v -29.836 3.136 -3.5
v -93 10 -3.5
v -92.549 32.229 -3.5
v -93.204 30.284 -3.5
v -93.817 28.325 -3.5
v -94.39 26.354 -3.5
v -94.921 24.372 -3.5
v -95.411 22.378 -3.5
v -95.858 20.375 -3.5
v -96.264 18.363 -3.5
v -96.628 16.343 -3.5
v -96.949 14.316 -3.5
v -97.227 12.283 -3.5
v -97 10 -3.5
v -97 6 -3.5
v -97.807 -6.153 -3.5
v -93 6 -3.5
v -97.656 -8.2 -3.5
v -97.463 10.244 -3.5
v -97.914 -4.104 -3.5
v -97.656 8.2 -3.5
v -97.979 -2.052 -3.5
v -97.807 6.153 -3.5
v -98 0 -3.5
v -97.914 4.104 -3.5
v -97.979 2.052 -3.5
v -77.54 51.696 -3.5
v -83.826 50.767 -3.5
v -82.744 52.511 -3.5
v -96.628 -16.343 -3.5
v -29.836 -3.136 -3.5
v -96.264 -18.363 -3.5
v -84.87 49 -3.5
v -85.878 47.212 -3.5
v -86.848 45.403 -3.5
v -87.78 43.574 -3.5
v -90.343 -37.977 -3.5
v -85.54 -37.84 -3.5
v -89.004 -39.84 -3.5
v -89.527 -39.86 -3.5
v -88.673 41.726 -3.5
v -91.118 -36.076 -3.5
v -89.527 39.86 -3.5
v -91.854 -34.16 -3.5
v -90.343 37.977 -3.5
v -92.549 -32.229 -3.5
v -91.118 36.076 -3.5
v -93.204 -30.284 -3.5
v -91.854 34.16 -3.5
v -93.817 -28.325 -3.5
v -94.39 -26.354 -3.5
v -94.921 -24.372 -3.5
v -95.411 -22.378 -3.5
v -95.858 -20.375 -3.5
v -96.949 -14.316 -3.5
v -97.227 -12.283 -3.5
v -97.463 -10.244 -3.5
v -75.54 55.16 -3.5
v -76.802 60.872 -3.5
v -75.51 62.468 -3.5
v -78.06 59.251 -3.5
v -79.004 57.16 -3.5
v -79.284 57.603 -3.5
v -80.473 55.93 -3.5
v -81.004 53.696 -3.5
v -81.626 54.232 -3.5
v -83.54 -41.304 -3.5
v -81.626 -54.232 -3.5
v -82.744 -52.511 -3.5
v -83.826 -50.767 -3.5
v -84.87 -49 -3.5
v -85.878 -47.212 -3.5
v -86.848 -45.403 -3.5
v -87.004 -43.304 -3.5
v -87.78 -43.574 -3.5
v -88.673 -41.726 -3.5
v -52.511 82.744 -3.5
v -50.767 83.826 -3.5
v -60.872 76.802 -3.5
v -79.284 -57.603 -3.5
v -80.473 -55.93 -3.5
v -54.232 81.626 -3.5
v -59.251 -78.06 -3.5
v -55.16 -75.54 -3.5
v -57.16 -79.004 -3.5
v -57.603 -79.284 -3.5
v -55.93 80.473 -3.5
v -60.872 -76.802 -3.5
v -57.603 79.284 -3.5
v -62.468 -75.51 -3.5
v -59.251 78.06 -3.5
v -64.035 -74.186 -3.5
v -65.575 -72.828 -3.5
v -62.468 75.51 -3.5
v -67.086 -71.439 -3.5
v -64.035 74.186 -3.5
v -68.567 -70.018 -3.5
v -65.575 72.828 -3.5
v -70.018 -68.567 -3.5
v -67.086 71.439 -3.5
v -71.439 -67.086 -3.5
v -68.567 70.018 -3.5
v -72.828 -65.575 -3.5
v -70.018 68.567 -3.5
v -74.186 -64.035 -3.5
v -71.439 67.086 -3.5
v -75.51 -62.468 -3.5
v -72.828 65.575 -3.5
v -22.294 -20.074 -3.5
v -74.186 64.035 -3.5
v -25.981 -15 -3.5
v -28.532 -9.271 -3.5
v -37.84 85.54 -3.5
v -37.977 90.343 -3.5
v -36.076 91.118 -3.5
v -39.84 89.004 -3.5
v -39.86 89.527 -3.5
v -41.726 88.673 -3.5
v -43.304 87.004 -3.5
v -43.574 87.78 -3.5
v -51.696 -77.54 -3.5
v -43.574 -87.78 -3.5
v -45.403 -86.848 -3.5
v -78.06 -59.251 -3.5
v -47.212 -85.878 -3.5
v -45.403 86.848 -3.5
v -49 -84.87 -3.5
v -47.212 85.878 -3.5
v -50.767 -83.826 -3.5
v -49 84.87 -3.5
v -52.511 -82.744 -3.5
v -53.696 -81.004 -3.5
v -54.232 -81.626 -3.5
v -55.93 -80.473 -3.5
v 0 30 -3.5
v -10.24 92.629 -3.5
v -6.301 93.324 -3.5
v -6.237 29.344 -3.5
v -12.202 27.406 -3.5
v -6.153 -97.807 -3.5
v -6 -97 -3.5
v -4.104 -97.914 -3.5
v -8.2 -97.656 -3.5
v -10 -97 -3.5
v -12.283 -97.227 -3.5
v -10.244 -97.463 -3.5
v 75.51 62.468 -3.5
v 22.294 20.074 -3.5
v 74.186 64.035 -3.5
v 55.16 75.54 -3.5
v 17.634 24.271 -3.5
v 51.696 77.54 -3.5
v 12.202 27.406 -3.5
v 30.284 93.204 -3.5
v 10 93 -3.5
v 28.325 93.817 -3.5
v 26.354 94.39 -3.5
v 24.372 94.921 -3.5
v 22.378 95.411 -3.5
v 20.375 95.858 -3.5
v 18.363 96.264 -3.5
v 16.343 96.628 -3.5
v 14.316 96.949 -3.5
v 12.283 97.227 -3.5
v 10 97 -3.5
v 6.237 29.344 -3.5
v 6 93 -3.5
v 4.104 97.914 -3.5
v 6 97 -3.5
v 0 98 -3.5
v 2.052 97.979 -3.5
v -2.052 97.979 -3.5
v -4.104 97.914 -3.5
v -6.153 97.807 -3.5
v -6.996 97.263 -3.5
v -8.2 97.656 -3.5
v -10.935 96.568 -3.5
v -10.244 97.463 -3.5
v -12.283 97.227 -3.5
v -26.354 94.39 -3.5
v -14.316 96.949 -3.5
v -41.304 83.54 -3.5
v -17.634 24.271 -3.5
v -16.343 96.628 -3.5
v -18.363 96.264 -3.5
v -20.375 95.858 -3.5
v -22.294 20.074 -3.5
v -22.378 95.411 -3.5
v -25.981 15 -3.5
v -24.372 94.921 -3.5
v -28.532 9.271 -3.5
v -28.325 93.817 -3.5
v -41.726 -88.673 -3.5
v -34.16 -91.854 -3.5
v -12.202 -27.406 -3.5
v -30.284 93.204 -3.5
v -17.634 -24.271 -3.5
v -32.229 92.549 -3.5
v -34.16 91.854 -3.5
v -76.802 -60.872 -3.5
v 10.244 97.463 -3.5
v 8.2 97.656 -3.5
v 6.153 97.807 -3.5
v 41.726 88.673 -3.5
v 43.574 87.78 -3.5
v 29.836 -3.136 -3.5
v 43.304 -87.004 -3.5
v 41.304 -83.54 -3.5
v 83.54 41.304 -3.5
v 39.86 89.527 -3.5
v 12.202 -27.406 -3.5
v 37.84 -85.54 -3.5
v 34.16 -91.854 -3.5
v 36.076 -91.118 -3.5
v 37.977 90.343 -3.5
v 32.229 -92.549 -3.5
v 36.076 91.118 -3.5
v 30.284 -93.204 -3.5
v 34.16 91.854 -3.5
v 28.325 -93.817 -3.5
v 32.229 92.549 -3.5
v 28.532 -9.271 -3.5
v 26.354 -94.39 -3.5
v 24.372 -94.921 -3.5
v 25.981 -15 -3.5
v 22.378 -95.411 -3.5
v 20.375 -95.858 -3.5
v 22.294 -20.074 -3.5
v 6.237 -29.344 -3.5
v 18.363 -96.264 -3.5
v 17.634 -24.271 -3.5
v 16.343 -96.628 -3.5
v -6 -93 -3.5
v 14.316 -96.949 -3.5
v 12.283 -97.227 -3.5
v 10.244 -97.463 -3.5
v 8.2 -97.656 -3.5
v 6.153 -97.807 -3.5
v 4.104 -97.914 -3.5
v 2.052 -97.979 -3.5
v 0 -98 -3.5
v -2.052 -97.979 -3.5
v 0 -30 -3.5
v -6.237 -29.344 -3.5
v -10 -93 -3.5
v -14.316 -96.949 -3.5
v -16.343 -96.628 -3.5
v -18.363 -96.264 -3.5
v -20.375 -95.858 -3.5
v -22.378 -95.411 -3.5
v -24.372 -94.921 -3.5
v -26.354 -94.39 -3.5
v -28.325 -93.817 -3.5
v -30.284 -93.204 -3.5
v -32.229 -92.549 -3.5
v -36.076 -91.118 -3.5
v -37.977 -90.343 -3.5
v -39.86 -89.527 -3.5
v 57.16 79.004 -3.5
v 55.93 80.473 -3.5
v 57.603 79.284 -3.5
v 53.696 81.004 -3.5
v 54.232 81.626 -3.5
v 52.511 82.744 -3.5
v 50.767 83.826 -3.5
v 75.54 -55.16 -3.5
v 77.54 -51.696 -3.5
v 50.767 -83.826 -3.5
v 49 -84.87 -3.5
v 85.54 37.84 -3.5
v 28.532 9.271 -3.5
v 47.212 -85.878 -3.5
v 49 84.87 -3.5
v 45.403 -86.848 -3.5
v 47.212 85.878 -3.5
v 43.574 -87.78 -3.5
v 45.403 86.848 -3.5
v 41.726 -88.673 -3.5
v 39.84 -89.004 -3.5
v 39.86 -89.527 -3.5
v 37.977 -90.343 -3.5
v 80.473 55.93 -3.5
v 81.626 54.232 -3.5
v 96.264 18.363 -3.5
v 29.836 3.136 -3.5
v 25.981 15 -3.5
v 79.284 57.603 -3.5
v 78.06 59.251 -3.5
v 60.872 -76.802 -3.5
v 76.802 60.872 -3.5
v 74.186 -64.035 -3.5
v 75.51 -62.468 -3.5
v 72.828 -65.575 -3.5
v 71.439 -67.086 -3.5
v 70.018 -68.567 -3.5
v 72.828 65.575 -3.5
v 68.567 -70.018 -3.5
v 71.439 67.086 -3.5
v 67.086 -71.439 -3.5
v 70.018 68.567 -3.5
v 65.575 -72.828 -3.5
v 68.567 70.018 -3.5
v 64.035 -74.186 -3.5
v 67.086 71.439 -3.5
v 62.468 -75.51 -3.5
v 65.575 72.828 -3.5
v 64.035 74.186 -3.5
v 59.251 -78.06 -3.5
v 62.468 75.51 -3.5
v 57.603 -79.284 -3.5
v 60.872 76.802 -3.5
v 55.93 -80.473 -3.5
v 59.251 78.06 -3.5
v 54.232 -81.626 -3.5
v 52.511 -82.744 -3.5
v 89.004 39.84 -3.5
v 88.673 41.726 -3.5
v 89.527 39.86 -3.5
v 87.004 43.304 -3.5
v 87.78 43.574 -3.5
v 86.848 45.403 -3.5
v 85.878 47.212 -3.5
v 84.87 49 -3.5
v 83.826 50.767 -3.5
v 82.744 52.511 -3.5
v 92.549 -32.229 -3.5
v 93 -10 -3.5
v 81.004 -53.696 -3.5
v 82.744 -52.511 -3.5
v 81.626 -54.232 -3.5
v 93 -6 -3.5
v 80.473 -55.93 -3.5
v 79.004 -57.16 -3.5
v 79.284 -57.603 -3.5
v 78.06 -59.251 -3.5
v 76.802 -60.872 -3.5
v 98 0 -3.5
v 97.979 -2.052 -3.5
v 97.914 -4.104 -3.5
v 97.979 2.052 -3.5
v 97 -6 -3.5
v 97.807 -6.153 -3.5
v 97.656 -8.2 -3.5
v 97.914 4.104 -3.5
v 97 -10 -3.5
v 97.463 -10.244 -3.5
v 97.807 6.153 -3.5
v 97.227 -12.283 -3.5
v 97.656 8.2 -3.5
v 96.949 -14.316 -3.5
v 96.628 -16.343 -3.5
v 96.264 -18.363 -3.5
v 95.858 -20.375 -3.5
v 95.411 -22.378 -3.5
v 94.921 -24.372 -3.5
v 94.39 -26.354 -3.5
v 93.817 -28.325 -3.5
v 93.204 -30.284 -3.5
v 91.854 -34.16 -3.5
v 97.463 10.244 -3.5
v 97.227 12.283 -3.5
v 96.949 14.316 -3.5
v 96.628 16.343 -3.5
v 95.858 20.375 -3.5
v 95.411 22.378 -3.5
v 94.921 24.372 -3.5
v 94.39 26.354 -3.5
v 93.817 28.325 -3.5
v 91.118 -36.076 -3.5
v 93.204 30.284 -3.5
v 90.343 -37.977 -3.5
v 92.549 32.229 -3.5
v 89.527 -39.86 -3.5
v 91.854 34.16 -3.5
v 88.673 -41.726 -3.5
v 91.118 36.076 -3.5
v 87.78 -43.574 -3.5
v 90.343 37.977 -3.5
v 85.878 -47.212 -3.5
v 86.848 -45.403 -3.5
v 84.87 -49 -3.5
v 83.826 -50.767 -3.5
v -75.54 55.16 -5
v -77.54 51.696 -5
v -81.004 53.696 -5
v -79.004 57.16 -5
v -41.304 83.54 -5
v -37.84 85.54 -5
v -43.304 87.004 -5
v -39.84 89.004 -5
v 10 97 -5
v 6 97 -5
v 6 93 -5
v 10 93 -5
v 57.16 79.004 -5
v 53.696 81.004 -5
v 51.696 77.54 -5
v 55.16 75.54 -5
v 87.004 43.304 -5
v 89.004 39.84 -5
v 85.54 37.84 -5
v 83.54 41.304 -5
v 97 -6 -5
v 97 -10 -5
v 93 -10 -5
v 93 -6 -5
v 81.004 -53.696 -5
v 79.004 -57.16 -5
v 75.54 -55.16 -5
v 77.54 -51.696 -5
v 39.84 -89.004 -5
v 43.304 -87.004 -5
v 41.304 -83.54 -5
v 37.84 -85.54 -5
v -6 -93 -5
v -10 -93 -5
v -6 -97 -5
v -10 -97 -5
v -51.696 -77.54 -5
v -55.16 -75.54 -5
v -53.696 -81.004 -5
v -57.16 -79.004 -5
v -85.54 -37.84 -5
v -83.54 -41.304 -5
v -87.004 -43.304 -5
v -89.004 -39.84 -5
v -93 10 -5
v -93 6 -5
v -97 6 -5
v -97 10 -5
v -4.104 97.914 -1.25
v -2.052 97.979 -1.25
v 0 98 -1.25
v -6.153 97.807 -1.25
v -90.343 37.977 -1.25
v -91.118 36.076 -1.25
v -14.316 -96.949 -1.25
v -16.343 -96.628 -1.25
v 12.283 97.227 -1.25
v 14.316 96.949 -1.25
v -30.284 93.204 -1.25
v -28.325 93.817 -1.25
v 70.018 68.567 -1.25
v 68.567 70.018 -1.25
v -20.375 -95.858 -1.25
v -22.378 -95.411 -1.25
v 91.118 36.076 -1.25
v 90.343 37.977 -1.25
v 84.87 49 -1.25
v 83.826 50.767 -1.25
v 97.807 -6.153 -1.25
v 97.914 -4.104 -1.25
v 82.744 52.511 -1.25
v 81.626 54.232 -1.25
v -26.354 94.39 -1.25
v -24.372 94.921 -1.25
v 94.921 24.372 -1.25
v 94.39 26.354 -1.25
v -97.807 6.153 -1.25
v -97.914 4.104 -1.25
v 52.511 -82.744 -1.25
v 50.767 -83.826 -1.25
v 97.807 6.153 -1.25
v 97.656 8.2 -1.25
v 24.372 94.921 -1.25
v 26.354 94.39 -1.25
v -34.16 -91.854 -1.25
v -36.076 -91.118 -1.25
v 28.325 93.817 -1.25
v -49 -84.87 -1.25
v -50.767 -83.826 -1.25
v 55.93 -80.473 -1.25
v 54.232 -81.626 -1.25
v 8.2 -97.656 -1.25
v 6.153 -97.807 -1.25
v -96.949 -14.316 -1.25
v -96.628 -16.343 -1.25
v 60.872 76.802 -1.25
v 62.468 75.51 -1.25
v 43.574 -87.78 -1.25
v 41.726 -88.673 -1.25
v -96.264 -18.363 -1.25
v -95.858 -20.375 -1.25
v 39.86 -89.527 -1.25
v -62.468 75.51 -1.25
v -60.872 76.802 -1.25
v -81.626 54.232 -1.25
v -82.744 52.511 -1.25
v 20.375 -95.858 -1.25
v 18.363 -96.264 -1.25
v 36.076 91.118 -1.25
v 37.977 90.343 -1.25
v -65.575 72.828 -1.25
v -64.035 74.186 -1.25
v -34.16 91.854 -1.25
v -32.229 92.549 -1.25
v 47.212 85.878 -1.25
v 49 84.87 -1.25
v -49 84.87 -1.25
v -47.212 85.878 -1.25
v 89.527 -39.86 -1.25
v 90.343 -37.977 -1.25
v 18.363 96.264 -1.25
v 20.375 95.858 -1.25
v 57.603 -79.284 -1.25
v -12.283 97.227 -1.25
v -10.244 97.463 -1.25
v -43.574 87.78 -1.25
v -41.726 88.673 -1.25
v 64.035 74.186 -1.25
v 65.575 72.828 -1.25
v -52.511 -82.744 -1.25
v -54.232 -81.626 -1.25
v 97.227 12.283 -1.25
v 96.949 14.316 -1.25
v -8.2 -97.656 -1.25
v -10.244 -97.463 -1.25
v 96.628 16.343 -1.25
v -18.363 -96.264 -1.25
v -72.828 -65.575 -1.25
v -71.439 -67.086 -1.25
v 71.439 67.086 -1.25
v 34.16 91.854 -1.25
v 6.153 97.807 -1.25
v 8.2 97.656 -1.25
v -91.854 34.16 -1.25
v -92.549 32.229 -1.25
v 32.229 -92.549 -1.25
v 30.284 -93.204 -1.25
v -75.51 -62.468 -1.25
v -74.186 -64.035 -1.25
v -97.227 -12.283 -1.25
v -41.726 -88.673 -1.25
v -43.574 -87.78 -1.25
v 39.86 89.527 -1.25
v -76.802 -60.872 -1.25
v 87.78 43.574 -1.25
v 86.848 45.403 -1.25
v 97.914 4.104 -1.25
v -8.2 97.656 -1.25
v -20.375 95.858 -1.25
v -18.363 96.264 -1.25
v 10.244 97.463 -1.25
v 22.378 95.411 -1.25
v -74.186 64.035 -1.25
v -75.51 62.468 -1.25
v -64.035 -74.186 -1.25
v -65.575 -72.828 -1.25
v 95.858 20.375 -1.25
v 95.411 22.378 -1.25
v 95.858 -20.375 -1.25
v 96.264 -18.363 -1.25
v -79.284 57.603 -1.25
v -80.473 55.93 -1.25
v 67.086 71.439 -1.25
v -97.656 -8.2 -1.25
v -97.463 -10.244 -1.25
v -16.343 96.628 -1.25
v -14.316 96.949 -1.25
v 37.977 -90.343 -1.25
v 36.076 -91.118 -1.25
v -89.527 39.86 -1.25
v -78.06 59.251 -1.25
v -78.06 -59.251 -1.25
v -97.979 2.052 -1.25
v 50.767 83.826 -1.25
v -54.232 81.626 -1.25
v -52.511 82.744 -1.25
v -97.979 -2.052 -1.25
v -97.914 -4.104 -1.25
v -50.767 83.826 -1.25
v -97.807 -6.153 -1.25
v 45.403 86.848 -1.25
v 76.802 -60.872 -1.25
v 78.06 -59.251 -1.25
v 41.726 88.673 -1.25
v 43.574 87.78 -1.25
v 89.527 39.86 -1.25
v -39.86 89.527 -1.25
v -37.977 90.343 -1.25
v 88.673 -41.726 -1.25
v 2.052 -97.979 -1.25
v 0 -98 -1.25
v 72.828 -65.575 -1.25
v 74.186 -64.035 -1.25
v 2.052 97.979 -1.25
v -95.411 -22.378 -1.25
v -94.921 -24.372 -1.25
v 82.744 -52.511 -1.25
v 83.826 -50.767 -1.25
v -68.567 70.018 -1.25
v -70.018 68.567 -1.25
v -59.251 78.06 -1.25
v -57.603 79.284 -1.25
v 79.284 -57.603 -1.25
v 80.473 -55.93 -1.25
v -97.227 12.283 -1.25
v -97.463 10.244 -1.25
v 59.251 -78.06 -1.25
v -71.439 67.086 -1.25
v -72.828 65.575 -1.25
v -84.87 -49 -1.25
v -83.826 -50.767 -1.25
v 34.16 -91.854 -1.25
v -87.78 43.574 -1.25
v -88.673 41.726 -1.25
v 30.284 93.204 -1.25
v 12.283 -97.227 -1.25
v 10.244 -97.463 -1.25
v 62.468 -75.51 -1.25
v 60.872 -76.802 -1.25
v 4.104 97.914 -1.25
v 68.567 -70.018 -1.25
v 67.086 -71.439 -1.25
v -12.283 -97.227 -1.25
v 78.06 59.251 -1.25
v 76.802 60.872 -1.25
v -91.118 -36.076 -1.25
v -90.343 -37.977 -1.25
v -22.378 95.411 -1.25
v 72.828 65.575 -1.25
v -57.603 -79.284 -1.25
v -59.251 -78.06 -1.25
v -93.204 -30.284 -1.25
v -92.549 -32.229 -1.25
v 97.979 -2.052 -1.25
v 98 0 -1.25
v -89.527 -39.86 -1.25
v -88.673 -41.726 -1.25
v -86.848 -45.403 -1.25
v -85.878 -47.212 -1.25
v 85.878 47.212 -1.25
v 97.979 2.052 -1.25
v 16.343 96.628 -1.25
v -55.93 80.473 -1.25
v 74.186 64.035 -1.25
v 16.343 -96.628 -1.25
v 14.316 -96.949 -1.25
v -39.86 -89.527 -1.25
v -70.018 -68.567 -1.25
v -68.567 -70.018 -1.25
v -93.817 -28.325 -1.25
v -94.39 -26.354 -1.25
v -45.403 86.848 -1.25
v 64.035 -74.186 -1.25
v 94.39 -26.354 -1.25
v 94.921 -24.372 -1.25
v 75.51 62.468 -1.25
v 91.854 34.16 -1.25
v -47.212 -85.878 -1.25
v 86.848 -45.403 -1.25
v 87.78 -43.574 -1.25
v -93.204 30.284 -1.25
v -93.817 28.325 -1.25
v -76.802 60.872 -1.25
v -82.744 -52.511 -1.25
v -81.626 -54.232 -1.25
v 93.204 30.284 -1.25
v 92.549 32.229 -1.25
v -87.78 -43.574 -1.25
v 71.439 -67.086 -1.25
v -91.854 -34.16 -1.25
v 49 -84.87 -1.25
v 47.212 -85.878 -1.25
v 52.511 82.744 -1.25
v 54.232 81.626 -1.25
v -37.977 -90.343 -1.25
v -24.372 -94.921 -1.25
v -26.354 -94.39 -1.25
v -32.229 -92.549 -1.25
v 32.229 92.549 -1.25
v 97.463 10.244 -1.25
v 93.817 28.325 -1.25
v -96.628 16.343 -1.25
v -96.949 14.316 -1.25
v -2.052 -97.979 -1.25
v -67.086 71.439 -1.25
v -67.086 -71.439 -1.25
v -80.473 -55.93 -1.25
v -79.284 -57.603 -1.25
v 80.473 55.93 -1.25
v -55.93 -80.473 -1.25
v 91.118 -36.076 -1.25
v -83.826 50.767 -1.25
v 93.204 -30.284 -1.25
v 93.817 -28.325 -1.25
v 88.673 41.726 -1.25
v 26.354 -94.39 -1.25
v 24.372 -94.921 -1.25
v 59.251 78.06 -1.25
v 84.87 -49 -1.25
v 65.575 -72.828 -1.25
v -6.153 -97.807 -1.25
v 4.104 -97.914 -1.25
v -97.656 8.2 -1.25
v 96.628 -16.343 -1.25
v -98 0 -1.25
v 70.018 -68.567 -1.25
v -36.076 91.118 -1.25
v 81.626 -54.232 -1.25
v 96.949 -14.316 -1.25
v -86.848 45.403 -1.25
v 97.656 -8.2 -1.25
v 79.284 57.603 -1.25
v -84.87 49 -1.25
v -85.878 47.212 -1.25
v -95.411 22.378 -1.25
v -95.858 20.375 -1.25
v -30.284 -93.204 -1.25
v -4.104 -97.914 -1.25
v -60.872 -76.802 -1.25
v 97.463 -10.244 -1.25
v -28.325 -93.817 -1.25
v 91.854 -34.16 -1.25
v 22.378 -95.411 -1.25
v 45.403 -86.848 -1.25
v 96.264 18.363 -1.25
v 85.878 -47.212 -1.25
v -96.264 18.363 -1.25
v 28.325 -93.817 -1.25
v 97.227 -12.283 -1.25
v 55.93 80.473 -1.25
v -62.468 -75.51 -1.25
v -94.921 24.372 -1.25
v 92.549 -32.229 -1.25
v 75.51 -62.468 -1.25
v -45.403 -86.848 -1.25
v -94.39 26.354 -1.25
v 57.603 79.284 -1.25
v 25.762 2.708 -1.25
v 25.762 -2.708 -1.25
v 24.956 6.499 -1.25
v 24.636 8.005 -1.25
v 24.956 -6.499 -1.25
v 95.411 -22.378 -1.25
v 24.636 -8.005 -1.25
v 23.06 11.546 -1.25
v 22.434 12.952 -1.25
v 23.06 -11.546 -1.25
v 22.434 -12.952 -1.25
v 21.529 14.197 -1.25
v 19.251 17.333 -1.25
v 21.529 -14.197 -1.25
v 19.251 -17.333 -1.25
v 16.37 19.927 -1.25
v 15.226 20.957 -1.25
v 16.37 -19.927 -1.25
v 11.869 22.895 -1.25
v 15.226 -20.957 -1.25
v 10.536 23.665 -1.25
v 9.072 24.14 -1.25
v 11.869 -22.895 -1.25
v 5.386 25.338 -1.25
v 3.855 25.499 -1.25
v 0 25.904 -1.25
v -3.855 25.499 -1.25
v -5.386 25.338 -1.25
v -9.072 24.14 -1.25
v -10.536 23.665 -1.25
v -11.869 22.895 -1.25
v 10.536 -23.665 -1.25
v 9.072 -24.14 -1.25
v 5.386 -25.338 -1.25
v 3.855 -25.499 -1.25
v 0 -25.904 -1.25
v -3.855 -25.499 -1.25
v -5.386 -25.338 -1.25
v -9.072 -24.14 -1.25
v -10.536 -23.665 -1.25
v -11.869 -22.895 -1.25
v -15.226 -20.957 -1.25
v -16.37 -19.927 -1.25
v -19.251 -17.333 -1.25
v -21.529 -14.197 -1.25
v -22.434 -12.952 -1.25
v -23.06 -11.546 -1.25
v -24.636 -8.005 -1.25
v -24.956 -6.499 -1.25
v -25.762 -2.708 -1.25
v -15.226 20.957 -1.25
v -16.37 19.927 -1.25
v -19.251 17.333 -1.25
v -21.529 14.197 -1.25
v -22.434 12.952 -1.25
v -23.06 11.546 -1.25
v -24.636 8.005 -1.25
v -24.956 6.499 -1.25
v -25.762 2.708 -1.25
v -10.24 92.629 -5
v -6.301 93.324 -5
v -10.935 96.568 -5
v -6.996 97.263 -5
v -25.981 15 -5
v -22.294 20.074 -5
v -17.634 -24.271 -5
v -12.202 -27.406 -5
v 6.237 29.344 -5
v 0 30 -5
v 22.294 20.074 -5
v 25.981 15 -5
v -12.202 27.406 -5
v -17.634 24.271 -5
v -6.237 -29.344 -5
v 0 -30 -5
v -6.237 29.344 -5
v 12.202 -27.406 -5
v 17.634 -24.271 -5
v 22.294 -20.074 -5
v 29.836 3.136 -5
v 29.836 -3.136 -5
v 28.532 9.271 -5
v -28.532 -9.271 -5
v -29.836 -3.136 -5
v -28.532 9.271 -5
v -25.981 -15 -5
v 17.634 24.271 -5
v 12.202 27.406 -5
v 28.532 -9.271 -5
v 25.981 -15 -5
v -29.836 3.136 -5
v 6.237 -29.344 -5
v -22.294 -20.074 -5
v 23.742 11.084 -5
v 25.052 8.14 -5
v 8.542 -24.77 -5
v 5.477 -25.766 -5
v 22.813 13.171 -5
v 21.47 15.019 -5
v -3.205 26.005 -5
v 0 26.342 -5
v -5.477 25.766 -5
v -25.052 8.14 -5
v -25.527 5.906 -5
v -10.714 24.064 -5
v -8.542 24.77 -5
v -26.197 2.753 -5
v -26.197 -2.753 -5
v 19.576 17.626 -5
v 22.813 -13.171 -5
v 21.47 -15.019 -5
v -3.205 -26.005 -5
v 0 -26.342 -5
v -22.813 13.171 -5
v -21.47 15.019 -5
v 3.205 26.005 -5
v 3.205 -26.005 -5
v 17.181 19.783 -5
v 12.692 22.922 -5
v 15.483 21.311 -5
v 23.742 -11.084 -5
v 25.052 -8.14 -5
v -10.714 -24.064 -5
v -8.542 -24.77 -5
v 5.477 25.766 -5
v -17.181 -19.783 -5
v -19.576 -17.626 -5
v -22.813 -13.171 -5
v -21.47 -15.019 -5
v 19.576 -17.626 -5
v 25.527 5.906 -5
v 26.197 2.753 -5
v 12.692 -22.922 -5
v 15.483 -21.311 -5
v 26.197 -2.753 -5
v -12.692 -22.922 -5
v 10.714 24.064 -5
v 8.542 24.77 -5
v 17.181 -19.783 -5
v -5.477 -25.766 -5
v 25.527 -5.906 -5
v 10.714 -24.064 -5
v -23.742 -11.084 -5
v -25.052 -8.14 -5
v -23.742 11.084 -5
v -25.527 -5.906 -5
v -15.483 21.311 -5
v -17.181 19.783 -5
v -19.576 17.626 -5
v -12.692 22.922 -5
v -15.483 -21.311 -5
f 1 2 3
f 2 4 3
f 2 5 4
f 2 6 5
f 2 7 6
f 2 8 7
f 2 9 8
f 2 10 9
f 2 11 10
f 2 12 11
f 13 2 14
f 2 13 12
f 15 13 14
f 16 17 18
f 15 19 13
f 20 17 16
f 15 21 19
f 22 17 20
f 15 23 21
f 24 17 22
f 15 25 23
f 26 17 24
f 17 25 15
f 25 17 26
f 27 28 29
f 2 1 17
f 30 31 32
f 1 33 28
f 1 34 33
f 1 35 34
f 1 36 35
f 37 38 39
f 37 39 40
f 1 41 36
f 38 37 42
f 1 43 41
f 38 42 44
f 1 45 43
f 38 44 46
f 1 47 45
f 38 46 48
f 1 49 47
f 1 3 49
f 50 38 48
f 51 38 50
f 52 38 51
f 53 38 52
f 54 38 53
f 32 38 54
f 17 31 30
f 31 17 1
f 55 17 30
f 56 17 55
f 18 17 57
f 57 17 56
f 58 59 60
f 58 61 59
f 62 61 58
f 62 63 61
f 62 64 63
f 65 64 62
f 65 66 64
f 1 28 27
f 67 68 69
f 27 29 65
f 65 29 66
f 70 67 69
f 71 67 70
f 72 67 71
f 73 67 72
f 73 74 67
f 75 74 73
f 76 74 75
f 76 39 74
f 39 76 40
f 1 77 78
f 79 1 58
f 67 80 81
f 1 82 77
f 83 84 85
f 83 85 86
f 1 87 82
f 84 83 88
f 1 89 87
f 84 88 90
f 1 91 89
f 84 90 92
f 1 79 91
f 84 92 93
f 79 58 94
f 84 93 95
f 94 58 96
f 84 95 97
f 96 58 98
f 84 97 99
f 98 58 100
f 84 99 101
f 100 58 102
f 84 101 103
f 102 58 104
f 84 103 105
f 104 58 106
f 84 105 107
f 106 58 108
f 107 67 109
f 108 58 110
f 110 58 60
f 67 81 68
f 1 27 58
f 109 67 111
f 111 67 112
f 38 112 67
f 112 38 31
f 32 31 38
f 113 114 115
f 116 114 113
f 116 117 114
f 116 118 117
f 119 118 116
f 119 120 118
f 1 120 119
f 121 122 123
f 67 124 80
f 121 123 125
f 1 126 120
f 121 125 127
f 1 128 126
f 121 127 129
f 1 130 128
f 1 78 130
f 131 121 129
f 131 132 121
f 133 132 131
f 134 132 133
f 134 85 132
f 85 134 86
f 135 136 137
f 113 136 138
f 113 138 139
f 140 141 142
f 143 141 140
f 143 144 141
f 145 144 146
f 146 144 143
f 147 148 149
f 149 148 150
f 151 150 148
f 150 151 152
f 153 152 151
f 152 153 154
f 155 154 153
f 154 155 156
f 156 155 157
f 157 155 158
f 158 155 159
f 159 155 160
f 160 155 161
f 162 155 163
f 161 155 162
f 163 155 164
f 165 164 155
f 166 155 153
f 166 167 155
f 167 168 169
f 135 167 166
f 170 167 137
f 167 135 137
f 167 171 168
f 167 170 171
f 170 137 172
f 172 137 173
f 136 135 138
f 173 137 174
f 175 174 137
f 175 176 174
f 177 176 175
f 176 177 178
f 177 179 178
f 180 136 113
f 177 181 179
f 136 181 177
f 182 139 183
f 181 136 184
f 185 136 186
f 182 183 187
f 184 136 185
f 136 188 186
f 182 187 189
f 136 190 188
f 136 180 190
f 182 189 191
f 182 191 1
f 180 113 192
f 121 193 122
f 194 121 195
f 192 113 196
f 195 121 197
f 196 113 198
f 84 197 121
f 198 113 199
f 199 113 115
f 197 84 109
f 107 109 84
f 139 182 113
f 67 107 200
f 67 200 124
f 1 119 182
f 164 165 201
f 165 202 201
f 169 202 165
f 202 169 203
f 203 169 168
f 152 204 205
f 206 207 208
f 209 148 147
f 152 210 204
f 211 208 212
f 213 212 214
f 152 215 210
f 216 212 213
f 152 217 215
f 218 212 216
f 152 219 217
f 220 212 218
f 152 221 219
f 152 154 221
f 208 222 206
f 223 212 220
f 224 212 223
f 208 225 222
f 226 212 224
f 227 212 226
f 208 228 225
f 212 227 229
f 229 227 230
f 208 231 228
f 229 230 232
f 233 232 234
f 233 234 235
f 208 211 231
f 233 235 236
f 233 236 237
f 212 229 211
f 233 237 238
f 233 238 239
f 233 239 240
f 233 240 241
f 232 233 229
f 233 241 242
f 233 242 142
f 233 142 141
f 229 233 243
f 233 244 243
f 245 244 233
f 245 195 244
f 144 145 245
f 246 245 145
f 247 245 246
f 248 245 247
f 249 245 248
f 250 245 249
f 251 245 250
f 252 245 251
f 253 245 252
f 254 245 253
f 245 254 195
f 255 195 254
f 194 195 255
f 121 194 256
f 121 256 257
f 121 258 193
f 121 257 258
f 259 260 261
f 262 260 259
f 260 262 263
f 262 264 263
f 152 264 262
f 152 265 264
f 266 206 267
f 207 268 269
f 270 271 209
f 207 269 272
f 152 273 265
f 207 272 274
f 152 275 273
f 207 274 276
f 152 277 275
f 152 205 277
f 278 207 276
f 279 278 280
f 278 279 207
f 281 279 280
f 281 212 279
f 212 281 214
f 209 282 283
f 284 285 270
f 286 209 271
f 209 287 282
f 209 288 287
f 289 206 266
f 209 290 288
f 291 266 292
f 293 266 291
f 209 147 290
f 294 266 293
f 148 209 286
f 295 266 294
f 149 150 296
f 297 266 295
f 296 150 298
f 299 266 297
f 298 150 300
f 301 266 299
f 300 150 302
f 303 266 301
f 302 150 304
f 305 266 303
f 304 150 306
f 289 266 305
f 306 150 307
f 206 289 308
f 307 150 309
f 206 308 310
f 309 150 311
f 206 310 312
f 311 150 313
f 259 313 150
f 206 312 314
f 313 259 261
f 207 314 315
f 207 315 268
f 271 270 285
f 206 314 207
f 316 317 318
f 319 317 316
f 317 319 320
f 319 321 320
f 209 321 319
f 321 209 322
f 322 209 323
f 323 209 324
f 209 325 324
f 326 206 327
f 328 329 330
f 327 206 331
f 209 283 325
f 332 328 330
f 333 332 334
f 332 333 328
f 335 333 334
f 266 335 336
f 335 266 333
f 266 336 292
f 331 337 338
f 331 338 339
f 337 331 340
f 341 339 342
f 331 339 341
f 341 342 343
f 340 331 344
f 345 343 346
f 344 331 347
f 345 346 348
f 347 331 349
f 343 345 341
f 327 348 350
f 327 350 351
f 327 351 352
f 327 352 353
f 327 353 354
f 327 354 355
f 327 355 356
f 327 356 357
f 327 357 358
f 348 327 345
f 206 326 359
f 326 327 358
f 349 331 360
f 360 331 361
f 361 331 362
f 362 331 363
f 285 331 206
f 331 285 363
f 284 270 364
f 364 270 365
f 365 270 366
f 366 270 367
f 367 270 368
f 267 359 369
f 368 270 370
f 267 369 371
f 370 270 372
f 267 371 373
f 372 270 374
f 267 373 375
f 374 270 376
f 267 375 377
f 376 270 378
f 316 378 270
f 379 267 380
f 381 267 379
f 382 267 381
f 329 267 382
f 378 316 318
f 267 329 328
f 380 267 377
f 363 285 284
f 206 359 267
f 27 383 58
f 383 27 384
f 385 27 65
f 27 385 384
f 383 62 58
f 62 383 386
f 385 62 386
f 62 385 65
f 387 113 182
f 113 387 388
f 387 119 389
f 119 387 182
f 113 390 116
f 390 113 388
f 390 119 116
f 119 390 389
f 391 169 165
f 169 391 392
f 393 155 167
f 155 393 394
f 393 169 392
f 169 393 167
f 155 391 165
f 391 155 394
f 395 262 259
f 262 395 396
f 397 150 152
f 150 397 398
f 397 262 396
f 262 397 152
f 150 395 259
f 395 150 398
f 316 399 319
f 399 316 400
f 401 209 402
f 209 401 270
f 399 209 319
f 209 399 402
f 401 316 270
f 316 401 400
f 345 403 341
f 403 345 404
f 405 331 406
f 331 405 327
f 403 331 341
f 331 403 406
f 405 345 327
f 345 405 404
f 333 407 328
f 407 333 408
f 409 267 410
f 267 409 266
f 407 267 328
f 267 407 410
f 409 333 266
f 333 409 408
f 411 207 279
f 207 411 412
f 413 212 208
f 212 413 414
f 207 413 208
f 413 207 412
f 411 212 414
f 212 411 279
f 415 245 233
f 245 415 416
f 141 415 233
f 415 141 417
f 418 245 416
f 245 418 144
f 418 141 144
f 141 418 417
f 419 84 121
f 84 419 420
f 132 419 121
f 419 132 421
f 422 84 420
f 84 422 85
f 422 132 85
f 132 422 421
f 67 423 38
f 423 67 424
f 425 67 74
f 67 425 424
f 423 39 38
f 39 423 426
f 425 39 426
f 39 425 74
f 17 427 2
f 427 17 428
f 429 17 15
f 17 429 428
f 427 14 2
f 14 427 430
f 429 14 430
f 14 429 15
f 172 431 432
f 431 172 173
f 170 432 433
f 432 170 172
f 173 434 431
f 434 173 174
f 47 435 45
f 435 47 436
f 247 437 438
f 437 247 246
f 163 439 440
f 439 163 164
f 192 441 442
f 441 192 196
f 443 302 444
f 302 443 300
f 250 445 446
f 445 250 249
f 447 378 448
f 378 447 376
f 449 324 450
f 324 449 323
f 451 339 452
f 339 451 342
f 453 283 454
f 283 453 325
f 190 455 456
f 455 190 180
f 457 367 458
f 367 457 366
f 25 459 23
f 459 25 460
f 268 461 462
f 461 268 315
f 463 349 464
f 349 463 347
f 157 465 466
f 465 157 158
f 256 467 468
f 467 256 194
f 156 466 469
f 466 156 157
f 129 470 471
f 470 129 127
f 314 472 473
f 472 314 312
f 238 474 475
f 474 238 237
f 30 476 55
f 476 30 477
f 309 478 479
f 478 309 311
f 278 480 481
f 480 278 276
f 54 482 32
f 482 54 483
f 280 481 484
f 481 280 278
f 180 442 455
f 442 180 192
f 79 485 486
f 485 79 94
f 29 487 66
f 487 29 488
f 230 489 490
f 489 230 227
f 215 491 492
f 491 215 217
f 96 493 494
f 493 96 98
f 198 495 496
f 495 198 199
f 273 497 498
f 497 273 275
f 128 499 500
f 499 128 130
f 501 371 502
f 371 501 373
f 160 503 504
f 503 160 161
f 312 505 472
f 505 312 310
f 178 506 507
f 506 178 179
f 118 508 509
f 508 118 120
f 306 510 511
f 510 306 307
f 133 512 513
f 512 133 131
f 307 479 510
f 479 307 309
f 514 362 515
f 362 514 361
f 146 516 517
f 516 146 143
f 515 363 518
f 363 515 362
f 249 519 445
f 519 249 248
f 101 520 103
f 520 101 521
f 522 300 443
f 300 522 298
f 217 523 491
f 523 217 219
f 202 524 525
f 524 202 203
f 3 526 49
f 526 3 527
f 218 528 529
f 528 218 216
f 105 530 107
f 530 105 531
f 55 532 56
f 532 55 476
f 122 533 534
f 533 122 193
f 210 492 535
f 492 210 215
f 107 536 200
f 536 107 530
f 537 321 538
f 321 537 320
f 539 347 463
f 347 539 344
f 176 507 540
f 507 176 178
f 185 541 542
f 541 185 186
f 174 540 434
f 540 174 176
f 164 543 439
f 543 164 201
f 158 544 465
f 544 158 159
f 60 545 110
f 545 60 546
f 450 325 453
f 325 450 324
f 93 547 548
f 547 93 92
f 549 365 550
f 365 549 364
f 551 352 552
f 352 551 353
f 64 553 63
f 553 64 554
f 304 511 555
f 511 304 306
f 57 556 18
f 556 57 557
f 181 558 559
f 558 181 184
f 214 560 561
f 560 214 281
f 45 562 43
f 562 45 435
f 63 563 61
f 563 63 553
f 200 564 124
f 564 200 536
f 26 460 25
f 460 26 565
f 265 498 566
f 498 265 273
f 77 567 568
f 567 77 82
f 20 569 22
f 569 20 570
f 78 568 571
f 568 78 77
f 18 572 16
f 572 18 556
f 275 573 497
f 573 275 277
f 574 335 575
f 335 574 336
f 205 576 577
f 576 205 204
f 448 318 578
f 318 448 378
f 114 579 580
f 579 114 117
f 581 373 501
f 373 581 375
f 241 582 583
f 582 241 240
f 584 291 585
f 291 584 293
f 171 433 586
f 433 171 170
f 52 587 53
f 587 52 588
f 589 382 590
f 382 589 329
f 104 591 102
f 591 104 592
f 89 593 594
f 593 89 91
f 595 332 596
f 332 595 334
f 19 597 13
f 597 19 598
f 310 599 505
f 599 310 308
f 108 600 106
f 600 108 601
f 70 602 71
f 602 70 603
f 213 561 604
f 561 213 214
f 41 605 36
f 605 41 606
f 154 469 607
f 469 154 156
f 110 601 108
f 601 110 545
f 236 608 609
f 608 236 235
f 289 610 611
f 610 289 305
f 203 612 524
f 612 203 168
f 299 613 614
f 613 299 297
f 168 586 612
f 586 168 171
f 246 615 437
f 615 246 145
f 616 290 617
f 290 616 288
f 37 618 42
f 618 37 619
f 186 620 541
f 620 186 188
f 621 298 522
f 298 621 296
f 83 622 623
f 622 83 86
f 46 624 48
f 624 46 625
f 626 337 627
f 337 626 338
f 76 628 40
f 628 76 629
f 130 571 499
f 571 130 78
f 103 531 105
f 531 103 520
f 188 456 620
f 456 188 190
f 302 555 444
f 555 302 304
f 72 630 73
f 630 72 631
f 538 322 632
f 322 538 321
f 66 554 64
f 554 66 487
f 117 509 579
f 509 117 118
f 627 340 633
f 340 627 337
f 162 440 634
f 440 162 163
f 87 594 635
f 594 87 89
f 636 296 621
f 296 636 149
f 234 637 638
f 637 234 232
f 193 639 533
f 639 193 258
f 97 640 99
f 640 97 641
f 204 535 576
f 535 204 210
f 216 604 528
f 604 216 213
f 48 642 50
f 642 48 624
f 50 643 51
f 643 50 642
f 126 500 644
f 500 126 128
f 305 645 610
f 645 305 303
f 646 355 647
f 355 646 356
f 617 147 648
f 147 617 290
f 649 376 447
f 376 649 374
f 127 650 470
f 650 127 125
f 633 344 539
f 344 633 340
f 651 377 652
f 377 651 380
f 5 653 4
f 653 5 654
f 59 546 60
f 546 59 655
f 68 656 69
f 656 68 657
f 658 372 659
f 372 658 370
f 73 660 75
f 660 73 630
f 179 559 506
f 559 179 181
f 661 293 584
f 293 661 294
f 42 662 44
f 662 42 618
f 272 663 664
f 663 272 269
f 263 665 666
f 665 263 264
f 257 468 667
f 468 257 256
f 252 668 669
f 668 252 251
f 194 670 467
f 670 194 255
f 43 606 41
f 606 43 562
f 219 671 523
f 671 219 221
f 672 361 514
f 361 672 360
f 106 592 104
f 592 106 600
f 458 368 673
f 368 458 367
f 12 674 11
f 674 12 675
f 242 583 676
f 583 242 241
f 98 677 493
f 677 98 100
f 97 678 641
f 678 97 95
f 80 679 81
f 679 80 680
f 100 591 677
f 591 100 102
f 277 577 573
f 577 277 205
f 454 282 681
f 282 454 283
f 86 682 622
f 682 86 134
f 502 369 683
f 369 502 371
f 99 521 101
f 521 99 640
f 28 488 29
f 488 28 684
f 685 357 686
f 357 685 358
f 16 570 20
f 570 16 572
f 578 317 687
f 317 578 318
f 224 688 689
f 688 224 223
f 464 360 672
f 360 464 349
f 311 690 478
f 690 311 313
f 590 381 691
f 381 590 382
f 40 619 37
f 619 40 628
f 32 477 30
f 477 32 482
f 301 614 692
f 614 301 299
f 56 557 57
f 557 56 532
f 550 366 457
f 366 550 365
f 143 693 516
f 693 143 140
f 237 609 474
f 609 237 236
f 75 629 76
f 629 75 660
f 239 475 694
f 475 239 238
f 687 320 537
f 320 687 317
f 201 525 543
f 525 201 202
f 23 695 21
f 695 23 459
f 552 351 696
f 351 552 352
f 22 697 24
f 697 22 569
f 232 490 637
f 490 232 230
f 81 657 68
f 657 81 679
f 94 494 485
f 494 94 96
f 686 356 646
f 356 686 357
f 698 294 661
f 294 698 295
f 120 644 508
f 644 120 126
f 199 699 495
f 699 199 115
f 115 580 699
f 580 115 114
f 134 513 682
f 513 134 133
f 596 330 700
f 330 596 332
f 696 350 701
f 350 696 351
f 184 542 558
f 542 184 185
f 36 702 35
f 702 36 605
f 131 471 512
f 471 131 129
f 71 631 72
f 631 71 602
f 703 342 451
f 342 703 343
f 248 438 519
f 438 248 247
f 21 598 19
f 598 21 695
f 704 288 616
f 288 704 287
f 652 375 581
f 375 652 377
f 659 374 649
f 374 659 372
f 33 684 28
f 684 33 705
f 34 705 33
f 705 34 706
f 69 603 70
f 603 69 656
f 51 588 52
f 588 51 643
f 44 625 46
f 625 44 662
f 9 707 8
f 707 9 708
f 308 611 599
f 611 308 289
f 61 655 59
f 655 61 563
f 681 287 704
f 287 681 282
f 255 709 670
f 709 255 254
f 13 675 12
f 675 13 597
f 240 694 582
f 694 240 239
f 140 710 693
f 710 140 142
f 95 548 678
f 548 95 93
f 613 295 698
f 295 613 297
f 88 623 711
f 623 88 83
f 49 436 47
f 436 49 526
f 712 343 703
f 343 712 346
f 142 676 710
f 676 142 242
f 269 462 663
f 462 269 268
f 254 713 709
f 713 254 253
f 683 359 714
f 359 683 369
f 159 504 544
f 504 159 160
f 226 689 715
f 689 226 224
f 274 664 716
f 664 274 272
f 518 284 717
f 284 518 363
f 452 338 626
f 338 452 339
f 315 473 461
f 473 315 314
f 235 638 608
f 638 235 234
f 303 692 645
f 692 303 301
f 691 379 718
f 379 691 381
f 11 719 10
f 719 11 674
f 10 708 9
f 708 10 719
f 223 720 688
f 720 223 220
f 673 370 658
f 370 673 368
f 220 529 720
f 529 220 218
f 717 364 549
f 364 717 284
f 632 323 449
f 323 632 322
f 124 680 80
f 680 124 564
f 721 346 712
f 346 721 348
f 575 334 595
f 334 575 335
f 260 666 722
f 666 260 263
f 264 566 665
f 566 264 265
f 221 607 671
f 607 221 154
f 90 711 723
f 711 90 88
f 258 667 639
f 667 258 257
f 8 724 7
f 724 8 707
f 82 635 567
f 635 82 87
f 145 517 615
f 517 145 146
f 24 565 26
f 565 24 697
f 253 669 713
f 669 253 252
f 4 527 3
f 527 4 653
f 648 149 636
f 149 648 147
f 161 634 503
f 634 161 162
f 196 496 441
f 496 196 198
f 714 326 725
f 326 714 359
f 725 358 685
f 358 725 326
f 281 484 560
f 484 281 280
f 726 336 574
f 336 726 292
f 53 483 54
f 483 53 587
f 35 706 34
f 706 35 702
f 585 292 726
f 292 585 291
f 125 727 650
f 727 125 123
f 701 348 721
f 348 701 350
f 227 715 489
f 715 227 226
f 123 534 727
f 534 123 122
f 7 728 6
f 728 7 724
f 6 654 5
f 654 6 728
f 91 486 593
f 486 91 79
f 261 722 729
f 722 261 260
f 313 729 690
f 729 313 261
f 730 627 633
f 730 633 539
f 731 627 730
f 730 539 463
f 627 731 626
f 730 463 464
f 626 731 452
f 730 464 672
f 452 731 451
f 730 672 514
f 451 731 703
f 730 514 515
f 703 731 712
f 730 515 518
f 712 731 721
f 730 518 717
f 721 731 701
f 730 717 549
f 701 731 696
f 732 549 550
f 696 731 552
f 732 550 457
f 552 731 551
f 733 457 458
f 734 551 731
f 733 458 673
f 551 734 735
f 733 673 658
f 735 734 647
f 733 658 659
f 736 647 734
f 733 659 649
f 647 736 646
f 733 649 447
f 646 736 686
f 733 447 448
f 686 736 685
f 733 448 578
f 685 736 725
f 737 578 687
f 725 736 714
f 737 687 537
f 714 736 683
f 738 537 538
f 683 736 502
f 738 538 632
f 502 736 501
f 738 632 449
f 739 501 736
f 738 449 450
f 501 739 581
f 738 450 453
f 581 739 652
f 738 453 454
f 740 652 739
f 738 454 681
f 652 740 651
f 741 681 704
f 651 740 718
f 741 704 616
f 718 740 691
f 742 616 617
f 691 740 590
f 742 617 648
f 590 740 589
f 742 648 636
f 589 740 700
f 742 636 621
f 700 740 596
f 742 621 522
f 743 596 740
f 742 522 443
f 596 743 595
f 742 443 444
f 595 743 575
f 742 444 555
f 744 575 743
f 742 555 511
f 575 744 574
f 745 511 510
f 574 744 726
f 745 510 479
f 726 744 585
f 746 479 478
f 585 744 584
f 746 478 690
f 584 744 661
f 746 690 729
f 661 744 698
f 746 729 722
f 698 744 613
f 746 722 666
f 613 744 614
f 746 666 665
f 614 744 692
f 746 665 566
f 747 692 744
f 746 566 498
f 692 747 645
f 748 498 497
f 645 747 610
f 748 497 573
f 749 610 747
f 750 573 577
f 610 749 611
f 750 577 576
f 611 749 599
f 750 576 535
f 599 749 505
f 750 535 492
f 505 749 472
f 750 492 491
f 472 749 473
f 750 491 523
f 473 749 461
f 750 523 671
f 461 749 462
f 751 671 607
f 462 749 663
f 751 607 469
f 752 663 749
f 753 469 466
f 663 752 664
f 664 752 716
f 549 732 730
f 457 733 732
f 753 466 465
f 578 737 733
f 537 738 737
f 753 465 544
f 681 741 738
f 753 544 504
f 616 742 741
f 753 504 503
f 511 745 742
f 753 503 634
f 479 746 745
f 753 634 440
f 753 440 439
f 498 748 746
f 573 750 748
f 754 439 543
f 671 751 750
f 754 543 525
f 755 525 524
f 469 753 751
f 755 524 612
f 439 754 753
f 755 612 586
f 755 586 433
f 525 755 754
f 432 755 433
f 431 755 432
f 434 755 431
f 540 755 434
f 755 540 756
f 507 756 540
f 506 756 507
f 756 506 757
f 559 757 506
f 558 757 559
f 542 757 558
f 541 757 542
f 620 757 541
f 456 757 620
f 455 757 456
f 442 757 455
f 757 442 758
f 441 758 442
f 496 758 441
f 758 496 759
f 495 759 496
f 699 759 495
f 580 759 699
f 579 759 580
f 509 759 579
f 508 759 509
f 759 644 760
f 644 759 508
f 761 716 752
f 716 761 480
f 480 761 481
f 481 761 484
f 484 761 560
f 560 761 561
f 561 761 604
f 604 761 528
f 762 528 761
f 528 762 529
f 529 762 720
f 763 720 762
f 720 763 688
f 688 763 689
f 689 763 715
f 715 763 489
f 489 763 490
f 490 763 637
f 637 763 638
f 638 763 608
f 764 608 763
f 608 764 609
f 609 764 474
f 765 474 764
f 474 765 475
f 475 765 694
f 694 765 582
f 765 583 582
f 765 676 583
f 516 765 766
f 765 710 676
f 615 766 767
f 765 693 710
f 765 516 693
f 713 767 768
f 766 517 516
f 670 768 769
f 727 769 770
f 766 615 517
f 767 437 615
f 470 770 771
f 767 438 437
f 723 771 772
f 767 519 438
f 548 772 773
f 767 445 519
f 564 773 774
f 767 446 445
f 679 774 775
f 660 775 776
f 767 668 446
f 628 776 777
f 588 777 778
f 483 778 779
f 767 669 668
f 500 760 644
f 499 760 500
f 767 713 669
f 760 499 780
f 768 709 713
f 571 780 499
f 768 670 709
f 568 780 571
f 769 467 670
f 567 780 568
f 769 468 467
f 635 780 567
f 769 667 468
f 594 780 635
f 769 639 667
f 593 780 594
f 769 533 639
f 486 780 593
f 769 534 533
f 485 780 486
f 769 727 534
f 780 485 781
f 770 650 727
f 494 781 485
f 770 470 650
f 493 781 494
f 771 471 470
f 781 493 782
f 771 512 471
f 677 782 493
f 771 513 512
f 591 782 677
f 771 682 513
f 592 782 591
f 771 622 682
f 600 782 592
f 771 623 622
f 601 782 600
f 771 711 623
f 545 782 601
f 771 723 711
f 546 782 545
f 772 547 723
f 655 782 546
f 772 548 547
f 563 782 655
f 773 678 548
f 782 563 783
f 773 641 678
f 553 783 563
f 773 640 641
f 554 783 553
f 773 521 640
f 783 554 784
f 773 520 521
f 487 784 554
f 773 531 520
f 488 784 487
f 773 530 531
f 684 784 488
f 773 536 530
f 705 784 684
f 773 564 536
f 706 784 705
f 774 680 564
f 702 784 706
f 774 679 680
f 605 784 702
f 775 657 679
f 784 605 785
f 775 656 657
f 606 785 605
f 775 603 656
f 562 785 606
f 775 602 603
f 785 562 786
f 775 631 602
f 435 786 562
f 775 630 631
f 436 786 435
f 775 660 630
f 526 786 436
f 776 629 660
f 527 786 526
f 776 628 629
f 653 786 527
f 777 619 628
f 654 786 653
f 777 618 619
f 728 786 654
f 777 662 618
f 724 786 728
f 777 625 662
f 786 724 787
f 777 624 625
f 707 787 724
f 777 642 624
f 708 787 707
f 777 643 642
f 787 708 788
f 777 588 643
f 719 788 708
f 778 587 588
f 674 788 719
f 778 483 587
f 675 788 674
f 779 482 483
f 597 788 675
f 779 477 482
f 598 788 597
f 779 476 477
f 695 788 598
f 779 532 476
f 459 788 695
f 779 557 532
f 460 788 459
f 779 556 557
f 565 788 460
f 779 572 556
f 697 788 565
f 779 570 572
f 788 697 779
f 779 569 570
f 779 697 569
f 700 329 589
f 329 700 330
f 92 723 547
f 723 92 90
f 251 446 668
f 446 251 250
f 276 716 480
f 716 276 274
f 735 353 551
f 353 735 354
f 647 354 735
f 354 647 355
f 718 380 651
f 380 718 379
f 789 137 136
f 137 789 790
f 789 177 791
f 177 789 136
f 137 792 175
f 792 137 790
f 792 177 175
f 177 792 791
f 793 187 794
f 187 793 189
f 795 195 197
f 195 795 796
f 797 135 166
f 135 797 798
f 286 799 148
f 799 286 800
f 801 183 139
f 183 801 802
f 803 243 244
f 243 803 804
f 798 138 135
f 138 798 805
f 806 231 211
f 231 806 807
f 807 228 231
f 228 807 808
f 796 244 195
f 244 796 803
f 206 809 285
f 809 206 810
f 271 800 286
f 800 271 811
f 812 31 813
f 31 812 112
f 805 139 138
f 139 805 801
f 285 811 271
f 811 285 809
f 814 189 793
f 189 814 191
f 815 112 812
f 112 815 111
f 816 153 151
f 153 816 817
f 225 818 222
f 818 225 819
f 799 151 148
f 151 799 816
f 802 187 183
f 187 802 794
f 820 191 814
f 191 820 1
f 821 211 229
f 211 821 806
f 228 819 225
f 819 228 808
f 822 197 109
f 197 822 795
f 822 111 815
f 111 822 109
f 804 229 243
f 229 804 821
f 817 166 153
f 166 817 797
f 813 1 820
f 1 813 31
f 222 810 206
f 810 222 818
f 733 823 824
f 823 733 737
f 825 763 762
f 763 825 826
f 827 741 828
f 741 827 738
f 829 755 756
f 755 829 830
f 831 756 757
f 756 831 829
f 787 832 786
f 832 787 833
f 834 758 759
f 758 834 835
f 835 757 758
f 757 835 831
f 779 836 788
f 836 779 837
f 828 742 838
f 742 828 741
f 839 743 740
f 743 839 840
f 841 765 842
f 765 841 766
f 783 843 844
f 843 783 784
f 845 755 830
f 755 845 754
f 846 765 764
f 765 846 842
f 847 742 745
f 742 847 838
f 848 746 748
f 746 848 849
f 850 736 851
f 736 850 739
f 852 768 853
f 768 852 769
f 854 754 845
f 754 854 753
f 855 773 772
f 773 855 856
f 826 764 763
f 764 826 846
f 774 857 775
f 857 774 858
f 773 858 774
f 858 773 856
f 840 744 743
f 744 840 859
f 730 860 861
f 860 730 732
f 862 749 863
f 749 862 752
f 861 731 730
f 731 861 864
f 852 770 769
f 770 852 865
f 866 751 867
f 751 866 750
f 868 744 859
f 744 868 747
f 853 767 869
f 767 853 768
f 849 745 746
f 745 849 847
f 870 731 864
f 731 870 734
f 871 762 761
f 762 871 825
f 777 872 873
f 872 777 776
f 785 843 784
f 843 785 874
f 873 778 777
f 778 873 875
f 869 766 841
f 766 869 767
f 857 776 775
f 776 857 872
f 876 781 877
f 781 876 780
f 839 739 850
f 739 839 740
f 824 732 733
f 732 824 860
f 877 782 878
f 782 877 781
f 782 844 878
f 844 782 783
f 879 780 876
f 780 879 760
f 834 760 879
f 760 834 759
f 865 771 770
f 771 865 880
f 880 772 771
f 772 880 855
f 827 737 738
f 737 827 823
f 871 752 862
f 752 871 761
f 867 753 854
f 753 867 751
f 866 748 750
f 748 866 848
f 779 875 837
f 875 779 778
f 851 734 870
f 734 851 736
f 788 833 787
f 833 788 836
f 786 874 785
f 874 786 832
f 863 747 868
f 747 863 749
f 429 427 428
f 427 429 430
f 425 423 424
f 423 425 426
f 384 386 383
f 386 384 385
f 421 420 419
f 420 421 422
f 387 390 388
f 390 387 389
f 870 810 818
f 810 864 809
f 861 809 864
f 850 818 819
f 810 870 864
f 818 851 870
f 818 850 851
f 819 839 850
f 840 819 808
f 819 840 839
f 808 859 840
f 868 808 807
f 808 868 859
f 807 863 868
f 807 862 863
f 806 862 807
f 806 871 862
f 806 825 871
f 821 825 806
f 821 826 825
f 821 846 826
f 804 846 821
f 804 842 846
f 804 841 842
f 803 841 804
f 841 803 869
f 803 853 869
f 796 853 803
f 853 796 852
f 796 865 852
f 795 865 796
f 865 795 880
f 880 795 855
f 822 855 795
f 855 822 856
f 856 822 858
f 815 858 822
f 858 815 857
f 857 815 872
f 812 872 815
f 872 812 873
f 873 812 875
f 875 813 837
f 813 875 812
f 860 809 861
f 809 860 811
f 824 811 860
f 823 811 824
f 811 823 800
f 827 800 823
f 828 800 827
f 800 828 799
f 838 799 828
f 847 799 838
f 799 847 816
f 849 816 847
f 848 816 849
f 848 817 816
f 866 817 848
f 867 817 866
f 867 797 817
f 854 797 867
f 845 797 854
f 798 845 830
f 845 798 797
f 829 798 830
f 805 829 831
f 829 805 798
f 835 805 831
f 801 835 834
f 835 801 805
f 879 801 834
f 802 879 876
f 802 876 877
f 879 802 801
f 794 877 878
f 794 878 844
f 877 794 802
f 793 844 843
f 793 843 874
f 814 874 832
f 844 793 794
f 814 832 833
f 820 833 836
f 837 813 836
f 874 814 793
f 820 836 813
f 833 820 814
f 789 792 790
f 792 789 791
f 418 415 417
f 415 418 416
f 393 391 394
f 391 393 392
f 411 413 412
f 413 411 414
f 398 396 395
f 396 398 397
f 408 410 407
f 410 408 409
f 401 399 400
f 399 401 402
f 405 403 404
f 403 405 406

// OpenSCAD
// file: ../clock.scad
clock_r = 104;
disc_thickness = 2.25;

hours = [
    "twelve",
    "one",
    "two",
    "three",
    "four",
    "five",
    "six",
    "seven",
    "eight",
    "nine",
    "ten",
    "eleven"
];
mins = [
    "o'clock",
    "oh five",
    "ten",
    "fifteen",
    "twenty",
    "twenty-five",
    "thirty",
    "thirty-five",
    "forty",
    "forty-five",
    "fifty",
    "fifty-five"
 ];

module clock_words(
    from_edge=6.0,
    letter_depth=disc_thickness,
    center_offset=0,
    font_size=12,
    words
) {
    for (i = [0 : len(words) - 1]) {
        angle = (i + 1) * 360 / len(mins);
        rotate(90 - angle) {
            translate([-clock_r + from_edge, center_offset]) {
                linear_extrude(height=letter_depth) {
                    text(words[i], size=font_size);
                }
            }
        }
    }
}

module hours_disc() {
    difference() {
        union() {
            if (!disable_hours_disc) {
                difference() {
                    // hours disc
                    $fn = 300; cylinder(disc_thickness, r=clock_r);

                    // see-through slots
                    for (i = [0 : len(mins) - 1]) {
                        width = clock_r - 55;
                        angle = (i + 1) * 360 / len(mins);
                        rotate(90 - angle) {
                            translate([52, 2, -0.5]) {
                                linear_extrude(height=disc_thickness + 1) {
                                    hull() {
                                        translate([0, 5]) circle(5.4);
                                        translate([width - 9, 5]) circle(5.4);
                                    }
                                }
                            }
                        }
                    }
                }
                
                // bumps
                for (i = [0 : len(mins) - 1]) {
                    angle = (i + 1) * 360 / len(mins);
                    rotate(90 - angle) {
                        translate([clock_r - 5, -10, -16]) {
                            cube([4, 4, 18]);
                        }
                    }
                }
            
                // home bump
                rotate(10) translate([clock_r - 5, -10, -16]) cube([4, 4, 18]);
            }
            
            // hours text
            if (!disable_hours_text) {
                color("blue") clock_words(from_edge=8, center_offset=2.1, words=hours);
            }
            
            // center cylinder and gear
            if (!disable_hours_disc) {
                translate([0, 0, -12]) cylinder(12, 26, 26);
            }
        }
    }
}

module minutes_disc() {
    difference() {
        union() {
            if (!disable_minutes_disc) {
                // minutes disc
                $fn = 300; color("pink") cylinder(disc_thickness, r=clock_r - 6);
                
                // bumps
                for (i = [0 : len(mins) - 1]){
                    angle = (i + 1) * 360 / len(mins);
                    rotate(90-angle) translate([clock_r - 11, -10, -8]) cube([4,4,8]);
                }
                
                // home bump
                rotate(10) translate([clock_r - 11, -10, -8]) cube([4, 4, 8]);
            }
            
            // hours text
            if (!disable_minutes_text) {
                color("red") clock_words(from_edge=10, center_offset=-10, font_size=7, words=mins);
            }
            
            // center cylinder and gear
            if (!disable_minutes_disc) {
                translate([0, 0, -10]) cylinder(10, 30, 30);
            }
        }
        
        // cut out center cylinder where hours disc fits in
        if (!disable_minutes_disc) {
            translate([0,0,-20]) cylinder(30, 30 - 1.5, 25);
        }
    }
}

module cover_plate() {
    square_size = clock_r * 1.9;
    move = (square_size/2);
    //$fs = 8;
    %difference() {
        translate([-move,-move]) linear_extrude(height=5) square(square_size);

        union() {
            // tear drop texture
            *translate([-move + 6.4, -move + 6.5, 5.5]) scale([0.82, 0.82, 0.82]) {
                for (j = [0 : 15]) {
                    for(i = [0 : 15]) {
                        translate([j * 15, i * 15, 0]) {
                            rotate([180]) {
                                scale([0.25, 0.25, 0.25]) {
                                    sphere(r = 20);
                                    translate([0, 0, 20 * sin(30)]) {
                                        cylinder(h = 30, r1 = 20 * cos(30), r2 = 0);
                                    }
                                }
                            }
                        }
                    }
                }
            }

            // main time cutout
            cutout_x = 44;
            cutout_y = 18;
            cutout_z = 6;
            translate([-48 - cutout_x, -9, -2]) {
                minkowski() {
                    cube([cutout_x, cutout_y, cutout_z]);
                    cylinder(r=5.4, h=6);
                }
            }
            /*
            translate([-30,1,-2]) {
                rotate(136) {
                    linear_extrude(height=10) {
                        polygon([[0,0],[22,80],[80,22]])
                    }
                }
            }
            */
        }
    }
}

// main clock parts
if (!disable_cover_plate) {
    translate([0, 0, 8]) cover_plate();
}

difference() {
    union() {
        display_hour = 11;
        display_min  = 25;
        rotate((360 / 12) * (display_hour - 2)) {
            hours_disc();
        }
        rotate((360 / 60) * (display_min - 10)) {
            translate([0, 0, -3.5]) minutes_disc();
        }
    }
    if (!disable_hours_disc || !disable_hours_text ||
        !disable_minutes_disc || !disable_minutes_text) {
        
        translate([0,0,-20]) cylinder(15, clock_r+4, clock_r+4);
    }
}
// main file
disable_cover_plate = true;
disable_hours_disc = true;
disable_hours_text = true;
disable_minutes_disc = false;
disable_minutes_text = true;

include <../clock.scad>
